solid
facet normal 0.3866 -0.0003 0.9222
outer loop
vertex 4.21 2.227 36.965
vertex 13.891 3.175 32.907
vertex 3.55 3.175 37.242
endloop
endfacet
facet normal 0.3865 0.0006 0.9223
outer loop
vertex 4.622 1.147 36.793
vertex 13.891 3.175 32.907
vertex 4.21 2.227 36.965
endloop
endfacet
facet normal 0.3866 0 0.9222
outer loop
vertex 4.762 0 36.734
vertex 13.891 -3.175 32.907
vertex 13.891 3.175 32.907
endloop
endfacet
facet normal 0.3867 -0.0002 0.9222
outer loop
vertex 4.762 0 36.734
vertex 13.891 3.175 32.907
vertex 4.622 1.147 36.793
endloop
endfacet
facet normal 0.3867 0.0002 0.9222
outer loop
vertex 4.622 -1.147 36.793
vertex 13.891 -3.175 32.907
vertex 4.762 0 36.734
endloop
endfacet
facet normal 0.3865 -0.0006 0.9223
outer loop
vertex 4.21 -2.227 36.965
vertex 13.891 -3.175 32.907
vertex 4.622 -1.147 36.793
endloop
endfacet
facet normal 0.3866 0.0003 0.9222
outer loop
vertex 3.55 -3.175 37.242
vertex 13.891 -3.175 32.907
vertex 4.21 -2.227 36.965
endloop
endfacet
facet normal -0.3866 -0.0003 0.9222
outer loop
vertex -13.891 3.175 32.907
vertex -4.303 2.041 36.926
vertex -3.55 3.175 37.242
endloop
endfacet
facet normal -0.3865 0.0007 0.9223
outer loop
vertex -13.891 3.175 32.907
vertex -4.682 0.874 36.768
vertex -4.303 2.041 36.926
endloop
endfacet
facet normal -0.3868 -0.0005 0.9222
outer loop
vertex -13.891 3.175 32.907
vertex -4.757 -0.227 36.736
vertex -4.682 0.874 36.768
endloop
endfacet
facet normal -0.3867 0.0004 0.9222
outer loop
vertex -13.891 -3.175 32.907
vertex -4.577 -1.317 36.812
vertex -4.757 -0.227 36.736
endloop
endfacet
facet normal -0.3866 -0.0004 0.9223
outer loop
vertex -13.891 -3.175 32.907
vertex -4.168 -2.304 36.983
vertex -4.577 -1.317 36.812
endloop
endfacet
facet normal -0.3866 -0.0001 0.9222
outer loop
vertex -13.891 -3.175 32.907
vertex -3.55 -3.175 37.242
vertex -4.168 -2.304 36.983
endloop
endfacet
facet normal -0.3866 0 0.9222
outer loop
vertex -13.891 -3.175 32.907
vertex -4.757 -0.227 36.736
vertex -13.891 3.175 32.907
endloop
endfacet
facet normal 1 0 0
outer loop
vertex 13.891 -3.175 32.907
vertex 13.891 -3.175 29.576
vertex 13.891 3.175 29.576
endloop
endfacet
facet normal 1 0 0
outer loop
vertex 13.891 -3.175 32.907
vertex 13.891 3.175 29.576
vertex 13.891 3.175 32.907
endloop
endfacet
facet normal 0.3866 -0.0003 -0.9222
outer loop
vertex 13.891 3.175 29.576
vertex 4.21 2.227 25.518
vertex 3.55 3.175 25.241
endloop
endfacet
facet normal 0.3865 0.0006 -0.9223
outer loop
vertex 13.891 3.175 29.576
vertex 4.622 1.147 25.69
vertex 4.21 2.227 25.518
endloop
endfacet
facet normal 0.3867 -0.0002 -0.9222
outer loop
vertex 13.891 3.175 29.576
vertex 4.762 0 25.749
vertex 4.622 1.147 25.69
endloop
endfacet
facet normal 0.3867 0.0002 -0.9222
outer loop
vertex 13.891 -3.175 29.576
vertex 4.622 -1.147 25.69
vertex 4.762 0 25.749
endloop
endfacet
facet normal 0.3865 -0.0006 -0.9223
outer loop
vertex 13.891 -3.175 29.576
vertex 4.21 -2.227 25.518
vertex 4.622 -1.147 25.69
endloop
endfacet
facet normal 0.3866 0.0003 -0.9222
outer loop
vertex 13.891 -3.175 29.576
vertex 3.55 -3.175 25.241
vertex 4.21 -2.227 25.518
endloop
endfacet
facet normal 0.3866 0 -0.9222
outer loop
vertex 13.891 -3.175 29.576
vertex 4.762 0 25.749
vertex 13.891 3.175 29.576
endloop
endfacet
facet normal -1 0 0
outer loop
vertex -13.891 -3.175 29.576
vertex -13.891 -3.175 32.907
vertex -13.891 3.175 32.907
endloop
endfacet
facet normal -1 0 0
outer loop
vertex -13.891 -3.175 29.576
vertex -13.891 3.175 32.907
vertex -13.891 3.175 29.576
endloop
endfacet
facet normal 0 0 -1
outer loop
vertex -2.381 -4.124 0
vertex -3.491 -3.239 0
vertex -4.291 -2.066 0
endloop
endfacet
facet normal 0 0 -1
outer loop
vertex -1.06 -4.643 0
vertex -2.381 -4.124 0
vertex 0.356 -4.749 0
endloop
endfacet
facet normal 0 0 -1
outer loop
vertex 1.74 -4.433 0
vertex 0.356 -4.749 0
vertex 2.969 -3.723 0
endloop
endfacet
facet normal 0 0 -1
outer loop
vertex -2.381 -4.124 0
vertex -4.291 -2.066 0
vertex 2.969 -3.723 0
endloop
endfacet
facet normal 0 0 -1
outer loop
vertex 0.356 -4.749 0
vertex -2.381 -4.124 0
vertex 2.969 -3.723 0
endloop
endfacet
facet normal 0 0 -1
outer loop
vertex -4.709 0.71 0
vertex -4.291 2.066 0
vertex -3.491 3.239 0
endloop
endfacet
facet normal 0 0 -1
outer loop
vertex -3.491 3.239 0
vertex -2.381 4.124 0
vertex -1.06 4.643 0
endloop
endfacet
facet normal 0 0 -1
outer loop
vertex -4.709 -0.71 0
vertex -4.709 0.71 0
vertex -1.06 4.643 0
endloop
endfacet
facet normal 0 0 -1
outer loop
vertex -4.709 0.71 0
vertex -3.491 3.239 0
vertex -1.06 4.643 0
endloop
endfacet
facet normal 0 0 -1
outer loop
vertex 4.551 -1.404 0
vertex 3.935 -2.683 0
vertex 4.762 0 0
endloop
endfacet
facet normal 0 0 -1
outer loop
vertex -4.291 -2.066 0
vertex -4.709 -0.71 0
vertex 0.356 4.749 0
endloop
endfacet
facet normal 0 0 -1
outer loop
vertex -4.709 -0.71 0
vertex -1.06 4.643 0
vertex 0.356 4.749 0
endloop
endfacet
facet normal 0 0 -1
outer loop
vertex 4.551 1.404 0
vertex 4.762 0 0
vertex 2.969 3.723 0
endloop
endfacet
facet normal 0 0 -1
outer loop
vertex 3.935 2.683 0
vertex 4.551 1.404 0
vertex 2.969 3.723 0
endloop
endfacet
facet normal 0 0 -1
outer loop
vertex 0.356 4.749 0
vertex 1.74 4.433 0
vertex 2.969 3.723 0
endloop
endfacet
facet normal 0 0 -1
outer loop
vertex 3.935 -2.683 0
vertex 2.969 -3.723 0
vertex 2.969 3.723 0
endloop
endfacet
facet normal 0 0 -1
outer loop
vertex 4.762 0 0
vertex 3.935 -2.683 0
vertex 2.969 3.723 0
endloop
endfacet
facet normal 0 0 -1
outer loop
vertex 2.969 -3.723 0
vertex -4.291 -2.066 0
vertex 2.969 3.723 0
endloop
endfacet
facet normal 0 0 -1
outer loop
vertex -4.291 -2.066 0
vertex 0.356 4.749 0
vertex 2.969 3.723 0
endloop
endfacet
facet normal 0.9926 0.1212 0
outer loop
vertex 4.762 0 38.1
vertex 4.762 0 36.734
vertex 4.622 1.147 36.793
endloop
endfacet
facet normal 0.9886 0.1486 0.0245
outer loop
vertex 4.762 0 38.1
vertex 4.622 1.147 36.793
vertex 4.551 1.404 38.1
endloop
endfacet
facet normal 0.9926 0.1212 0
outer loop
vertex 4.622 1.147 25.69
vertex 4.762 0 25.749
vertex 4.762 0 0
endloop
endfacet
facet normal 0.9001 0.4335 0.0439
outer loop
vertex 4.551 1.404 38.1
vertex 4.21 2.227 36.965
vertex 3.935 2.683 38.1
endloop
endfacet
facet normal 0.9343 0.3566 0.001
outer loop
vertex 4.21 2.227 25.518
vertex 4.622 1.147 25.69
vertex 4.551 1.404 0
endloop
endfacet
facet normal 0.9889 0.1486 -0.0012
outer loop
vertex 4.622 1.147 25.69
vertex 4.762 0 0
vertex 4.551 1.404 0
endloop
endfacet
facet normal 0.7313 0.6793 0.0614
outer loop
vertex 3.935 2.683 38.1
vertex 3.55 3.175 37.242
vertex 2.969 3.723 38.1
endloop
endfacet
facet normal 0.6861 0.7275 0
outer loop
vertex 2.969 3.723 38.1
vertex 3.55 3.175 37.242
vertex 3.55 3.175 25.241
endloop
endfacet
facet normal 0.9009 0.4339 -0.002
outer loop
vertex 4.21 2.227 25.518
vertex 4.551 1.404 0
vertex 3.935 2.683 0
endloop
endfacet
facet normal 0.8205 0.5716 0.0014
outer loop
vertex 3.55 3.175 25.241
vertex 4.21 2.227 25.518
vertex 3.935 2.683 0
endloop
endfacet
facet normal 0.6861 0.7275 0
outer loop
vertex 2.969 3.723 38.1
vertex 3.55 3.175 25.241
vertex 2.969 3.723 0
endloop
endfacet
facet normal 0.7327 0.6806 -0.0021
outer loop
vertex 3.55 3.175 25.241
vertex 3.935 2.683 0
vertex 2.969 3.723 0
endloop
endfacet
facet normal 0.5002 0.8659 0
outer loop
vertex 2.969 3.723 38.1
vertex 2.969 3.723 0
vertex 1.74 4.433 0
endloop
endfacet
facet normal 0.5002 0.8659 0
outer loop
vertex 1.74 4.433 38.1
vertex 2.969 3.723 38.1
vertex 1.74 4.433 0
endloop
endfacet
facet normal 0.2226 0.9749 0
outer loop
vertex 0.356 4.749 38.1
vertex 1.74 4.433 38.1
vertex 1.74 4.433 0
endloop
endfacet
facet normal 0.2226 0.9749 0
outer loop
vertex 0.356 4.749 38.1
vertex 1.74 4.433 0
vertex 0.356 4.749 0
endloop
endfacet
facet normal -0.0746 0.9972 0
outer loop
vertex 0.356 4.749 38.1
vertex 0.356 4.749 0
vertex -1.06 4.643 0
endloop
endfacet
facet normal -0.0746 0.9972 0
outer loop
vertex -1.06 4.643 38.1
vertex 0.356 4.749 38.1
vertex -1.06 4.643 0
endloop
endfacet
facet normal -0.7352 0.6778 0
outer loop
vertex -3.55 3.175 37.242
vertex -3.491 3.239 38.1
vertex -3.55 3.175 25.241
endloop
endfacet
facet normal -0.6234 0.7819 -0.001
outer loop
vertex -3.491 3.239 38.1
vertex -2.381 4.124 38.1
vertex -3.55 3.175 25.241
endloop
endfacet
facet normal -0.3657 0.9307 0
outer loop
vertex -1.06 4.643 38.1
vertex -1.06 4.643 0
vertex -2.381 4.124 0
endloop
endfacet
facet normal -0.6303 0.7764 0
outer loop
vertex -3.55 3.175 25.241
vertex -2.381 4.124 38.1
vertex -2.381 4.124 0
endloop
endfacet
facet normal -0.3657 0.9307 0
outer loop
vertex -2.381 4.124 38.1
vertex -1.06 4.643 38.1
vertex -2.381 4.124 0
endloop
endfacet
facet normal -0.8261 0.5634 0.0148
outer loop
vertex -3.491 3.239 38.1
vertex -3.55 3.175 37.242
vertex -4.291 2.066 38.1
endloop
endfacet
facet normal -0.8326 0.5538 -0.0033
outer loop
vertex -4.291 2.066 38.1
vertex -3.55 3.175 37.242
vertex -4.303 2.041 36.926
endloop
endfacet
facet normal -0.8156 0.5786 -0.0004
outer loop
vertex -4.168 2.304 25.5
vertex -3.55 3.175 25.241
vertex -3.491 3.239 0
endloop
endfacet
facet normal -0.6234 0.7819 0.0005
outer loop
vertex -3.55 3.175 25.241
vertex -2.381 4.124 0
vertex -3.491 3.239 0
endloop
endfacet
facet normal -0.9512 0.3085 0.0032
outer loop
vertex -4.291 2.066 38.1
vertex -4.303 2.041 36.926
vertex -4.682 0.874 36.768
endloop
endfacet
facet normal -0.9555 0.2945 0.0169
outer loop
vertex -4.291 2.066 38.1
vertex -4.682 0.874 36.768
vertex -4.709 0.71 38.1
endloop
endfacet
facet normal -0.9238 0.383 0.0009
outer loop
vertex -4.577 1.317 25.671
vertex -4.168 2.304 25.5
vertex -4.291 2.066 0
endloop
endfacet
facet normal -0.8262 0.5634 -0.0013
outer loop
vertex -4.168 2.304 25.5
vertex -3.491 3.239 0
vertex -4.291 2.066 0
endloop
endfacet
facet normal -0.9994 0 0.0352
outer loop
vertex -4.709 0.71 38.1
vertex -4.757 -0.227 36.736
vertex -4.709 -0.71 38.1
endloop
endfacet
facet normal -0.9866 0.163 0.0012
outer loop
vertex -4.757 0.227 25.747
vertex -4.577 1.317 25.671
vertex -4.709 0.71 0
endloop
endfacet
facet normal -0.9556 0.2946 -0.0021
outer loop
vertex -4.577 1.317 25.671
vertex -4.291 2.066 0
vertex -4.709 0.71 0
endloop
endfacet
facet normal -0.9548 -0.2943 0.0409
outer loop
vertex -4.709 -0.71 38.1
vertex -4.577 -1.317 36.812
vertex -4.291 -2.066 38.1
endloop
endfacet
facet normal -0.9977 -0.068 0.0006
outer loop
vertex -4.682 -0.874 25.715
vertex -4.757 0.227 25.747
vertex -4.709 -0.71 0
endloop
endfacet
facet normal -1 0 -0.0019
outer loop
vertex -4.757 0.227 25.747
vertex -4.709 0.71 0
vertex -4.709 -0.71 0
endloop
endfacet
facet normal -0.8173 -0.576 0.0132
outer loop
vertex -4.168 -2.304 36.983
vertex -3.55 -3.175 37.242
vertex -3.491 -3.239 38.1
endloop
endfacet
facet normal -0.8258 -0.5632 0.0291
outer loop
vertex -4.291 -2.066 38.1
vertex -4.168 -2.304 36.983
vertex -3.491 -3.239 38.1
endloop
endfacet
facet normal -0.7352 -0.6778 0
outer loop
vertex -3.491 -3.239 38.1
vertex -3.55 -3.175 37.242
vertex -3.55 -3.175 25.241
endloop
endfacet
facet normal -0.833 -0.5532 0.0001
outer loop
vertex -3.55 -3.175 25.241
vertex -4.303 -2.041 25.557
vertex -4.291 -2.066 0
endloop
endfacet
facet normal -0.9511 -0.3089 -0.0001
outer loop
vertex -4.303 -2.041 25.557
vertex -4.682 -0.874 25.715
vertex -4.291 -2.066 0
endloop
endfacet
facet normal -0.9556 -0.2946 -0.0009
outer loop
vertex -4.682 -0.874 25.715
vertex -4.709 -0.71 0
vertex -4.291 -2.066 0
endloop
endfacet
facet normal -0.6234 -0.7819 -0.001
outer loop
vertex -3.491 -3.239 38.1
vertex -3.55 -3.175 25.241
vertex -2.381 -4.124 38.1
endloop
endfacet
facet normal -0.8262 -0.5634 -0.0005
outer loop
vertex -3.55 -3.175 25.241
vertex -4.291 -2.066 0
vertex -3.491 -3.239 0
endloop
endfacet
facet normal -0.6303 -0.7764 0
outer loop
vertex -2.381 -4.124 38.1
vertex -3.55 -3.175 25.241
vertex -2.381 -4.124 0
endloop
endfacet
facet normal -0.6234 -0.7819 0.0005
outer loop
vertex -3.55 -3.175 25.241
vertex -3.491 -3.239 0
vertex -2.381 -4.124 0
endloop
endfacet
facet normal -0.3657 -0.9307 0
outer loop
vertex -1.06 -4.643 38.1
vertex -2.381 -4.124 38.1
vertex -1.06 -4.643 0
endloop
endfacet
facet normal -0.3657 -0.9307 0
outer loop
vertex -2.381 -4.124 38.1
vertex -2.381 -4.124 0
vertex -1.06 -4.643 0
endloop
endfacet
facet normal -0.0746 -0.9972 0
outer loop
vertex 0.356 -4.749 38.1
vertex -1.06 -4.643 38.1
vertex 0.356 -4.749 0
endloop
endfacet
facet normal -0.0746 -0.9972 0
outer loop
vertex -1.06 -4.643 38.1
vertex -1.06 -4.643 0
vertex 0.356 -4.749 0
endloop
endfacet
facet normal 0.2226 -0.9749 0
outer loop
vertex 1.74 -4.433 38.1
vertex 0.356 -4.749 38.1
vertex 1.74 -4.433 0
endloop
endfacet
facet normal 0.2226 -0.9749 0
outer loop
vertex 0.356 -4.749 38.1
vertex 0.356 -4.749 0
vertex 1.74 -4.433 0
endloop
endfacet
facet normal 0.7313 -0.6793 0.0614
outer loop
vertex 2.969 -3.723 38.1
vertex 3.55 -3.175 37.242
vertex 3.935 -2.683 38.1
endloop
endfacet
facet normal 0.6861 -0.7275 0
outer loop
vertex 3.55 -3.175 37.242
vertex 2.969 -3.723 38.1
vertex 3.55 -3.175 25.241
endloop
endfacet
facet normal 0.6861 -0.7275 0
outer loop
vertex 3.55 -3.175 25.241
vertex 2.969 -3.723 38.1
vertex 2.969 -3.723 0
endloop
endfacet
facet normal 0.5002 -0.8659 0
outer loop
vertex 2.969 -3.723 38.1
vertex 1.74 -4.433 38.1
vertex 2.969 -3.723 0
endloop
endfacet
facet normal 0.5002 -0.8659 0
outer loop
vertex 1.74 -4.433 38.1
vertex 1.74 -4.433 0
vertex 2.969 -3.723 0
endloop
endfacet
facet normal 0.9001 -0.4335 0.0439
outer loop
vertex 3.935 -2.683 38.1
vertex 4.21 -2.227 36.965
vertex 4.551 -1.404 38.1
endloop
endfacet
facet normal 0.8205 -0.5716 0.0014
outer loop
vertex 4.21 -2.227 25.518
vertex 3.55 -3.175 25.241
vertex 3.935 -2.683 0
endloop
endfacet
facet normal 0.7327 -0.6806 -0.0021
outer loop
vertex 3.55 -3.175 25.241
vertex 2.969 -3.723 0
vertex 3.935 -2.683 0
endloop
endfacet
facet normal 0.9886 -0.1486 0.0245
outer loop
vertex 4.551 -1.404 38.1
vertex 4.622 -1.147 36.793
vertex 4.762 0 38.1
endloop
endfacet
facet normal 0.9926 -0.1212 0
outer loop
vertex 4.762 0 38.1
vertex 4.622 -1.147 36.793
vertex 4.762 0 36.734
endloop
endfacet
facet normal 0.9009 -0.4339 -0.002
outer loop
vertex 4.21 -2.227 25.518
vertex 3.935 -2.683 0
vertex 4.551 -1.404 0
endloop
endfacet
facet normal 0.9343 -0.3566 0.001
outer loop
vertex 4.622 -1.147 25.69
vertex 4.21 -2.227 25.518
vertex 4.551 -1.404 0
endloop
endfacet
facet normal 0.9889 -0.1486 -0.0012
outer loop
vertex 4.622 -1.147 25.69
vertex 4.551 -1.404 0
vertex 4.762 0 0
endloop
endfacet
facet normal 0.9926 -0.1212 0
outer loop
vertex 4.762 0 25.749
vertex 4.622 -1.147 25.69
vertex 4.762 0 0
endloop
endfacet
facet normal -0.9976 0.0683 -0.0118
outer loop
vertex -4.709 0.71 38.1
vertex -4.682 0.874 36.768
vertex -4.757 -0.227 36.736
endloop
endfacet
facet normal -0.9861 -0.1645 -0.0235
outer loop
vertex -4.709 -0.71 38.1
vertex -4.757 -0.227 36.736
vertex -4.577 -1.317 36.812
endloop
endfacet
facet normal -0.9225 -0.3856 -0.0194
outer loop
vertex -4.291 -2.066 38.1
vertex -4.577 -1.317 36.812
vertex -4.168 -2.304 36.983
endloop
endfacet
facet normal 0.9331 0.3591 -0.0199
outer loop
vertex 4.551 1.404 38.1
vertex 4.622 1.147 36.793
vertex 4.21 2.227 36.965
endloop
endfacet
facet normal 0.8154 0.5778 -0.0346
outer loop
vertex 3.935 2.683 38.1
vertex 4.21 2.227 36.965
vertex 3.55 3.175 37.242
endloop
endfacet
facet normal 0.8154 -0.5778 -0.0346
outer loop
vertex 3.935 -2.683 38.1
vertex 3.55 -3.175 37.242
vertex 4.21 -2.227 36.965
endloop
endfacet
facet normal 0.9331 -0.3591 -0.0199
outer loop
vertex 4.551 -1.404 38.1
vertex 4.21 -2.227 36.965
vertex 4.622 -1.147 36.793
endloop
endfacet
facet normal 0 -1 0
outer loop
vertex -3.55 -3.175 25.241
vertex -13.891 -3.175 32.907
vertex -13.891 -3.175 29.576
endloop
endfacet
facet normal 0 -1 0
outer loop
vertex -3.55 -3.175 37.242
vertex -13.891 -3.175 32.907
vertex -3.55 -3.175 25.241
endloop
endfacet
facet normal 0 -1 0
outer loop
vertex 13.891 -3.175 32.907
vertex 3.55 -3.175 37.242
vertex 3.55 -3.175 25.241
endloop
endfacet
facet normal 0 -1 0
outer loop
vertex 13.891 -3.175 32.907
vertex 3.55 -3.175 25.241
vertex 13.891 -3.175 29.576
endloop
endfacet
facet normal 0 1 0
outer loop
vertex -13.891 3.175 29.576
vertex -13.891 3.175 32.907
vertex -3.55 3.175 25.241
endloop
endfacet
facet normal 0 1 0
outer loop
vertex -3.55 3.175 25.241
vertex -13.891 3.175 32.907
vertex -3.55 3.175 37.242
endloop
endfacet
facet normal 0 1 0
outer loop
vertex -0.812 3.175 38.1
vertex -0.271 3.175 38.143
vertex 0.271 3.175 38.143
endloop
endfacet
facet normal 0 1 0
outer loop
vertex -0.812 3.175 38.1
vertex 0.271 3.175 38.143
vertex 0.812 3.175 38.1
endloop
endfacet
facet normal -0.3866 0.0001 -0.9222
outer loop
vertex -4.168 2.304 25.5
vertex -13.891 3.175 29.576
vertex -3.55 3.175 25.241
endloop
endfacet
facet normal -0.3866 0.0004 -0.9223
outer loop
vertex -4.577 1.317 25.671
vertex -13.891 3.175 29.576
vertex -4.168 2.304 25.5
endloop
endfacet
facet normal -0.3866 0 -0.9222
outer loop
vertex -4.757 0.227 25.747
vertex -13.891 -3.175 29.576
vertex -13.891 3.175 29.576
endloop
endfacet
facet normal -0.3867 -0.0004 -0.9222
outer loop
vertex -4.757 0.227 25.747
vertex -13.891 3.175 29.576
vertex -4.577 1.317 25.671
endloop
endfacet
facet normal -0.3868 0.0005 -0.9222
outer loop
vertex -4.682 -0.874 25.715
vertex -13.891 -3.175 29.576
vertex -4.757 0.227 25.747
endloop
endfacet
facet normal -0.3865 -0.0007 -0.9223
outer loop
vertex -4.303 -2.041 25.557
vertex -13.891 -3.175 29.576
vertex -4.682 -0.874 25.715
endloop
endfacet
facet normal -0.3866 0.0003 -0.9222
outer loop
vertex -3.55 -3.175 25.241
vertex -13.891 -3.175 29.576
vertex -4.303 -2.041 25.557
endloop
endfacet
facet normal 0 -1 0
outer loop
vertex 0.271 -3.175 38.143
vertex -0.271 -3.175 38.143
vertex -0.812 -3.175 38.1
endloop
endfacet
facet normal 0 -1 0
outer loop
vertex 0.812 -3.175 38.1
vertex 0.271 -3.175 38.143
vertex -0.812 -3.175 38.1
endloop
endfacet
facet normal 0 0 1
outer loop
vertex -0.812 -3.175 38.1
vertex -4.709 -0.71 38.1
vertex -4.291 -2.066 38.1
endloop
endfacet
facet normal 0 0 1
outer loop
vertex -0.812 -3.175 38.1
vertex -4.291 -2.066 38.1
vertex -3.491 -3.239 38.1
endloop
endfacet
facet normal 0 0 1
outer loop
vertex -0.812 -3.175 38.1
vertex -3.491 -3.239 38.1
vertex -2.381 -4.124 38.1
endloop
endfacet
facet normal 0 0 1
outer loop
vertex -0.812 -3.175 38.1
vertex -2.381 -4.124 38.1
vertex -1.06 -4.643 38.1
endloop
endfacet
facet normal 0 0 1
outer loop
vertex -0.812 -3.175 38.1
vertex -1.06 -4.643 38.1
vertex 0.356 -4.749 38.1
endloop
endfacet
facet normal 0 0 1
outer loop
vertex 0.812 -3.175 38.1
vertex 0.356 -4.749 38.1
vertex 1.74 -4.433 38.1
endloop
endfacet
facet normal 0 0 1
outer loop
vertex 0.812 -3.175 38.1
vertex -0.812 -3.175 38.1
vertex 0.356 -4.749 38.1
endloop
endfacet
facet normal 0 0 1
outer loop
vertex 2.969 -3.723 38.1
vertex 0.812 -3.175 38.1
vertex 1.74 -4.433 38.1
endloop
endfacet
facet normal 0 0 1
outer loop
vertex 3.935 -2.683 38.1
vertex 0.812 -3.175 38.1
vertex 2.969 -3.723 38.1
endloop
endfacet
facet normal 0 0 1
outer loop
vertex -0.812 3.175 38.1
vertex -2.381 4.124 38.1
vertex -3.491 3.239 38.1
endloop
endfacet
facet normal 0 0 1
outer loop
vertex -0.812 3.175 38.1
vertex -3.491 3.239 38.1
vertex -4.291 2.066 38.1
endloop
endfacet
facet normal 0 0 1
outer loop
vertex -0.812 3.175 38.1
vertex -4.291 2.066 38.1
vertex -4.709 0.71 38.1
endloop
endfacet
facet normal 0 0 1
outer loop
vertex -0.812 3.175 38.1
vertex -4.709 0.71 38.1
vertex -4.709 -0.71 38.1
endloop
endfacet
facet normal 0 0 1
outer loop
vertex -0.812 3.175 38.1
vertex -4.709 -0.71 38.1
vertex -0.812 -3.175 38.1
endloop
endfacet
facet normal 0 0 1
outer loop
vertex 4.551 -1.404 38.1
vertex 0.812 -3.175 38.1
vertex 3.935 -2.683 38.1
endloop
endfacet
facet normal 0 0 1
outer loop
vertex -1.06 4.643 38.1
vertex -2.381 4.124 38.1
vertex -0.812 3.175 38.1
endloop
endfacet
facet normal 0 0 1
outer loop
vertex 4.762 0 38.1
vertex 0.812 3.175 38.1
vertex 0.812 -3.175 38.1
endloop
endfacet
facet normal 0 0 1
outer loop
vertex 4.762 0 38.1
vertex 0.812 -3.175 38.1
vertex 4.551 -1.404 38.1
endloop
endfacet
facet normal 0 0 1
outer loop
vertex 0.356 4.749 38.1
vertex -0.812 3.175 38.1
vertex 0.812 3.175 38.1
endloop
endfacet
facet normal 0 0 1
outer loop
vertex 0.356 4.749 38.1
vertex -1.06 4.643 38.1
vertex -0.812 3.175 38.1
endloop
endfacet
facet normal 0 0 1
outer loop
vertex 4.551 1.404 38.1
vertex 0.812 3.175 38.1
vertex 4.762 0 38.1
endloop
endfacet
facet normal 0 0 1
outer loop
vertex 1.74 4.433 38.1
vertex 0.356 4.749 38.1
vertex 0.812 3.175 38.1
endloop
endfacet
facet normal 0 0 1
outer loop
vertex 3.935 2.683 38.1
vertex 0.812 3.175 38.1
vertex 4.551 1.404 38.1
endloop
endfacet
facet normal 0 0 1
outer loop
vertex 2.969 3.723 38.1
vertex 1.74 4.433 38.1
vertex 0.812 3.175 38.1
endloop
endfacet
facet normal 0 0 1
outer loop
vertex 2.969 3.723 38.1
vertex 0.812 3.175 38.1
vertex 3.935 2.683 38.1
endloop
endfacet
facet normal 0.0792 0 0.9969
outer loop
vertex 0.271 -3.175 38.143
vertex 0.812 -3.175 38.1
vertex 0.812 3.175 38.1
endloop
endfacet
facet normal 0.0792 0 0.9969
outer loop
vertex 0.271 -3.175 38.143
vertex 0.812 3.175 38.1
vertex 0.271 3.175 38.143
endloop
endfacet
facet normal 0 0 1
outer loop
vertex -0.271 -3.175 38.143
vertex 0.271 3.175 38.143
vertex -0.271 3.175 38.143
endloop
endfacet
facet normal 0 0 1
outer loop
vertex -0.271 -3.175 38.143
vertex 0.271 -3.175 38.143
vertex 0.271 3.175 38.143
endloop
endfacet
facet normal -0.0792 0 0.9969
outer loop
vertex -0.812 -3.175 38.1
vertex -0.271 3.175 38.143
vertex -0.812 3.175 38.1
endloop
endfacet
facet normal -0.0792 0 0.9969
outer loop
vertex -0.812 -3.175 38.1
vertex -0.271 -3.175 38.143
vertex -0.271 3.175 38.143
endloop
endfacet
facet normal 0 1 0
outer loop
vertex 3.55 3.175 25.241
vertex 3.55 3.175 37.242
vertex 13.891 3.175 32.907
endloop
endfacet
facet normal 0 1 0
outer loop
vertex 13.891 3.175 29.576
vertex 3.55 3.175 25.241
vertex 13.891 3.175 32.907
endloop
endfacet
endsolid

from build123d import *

# Parameters (mm, degrees)
F0_R     = 4.7625
F1_DEPTH = 38.1
F3_DEPTH = 3.175


with BuildPart() as f1:
    # F0 (on Top) → F1 (new body)
    with BuildSketch(Plane.XY):
        Circle(F0_R)
    extrude(amount=F1_DEPTH)

    # F2 (on Front) → F3 (join, symmetric)
    with BuildSketch(Plane.XZ):
        with BuildLine():
            Line((2.669991, 24.872054), (13.890625, 29.575619))
            Line((13.890625, 29.575619), (13.890625, 32.907334))
            Line((13.890625, 32.907334), (2.669991, 37.610899))
            ThreePointArc((2.669991, 37.610899), (0, 38.147879), (-2.669991, 37.610899))
            Line((-2.669991, 37.610899), (-13.890625, 32.907334))
            Line((-13.890625, 32.907334), (-13.890625, 29.575619))
            Line((-13.890625, 29.575619), (-2.669991, 24.872054))
            ThreePointArc((-2.669991, 24.872054), (0, 24.335074), (2.669991, 24.872054))
        make_face()
    extrude(amount=F3_DEPTH, both=True)


solid = f1.part
